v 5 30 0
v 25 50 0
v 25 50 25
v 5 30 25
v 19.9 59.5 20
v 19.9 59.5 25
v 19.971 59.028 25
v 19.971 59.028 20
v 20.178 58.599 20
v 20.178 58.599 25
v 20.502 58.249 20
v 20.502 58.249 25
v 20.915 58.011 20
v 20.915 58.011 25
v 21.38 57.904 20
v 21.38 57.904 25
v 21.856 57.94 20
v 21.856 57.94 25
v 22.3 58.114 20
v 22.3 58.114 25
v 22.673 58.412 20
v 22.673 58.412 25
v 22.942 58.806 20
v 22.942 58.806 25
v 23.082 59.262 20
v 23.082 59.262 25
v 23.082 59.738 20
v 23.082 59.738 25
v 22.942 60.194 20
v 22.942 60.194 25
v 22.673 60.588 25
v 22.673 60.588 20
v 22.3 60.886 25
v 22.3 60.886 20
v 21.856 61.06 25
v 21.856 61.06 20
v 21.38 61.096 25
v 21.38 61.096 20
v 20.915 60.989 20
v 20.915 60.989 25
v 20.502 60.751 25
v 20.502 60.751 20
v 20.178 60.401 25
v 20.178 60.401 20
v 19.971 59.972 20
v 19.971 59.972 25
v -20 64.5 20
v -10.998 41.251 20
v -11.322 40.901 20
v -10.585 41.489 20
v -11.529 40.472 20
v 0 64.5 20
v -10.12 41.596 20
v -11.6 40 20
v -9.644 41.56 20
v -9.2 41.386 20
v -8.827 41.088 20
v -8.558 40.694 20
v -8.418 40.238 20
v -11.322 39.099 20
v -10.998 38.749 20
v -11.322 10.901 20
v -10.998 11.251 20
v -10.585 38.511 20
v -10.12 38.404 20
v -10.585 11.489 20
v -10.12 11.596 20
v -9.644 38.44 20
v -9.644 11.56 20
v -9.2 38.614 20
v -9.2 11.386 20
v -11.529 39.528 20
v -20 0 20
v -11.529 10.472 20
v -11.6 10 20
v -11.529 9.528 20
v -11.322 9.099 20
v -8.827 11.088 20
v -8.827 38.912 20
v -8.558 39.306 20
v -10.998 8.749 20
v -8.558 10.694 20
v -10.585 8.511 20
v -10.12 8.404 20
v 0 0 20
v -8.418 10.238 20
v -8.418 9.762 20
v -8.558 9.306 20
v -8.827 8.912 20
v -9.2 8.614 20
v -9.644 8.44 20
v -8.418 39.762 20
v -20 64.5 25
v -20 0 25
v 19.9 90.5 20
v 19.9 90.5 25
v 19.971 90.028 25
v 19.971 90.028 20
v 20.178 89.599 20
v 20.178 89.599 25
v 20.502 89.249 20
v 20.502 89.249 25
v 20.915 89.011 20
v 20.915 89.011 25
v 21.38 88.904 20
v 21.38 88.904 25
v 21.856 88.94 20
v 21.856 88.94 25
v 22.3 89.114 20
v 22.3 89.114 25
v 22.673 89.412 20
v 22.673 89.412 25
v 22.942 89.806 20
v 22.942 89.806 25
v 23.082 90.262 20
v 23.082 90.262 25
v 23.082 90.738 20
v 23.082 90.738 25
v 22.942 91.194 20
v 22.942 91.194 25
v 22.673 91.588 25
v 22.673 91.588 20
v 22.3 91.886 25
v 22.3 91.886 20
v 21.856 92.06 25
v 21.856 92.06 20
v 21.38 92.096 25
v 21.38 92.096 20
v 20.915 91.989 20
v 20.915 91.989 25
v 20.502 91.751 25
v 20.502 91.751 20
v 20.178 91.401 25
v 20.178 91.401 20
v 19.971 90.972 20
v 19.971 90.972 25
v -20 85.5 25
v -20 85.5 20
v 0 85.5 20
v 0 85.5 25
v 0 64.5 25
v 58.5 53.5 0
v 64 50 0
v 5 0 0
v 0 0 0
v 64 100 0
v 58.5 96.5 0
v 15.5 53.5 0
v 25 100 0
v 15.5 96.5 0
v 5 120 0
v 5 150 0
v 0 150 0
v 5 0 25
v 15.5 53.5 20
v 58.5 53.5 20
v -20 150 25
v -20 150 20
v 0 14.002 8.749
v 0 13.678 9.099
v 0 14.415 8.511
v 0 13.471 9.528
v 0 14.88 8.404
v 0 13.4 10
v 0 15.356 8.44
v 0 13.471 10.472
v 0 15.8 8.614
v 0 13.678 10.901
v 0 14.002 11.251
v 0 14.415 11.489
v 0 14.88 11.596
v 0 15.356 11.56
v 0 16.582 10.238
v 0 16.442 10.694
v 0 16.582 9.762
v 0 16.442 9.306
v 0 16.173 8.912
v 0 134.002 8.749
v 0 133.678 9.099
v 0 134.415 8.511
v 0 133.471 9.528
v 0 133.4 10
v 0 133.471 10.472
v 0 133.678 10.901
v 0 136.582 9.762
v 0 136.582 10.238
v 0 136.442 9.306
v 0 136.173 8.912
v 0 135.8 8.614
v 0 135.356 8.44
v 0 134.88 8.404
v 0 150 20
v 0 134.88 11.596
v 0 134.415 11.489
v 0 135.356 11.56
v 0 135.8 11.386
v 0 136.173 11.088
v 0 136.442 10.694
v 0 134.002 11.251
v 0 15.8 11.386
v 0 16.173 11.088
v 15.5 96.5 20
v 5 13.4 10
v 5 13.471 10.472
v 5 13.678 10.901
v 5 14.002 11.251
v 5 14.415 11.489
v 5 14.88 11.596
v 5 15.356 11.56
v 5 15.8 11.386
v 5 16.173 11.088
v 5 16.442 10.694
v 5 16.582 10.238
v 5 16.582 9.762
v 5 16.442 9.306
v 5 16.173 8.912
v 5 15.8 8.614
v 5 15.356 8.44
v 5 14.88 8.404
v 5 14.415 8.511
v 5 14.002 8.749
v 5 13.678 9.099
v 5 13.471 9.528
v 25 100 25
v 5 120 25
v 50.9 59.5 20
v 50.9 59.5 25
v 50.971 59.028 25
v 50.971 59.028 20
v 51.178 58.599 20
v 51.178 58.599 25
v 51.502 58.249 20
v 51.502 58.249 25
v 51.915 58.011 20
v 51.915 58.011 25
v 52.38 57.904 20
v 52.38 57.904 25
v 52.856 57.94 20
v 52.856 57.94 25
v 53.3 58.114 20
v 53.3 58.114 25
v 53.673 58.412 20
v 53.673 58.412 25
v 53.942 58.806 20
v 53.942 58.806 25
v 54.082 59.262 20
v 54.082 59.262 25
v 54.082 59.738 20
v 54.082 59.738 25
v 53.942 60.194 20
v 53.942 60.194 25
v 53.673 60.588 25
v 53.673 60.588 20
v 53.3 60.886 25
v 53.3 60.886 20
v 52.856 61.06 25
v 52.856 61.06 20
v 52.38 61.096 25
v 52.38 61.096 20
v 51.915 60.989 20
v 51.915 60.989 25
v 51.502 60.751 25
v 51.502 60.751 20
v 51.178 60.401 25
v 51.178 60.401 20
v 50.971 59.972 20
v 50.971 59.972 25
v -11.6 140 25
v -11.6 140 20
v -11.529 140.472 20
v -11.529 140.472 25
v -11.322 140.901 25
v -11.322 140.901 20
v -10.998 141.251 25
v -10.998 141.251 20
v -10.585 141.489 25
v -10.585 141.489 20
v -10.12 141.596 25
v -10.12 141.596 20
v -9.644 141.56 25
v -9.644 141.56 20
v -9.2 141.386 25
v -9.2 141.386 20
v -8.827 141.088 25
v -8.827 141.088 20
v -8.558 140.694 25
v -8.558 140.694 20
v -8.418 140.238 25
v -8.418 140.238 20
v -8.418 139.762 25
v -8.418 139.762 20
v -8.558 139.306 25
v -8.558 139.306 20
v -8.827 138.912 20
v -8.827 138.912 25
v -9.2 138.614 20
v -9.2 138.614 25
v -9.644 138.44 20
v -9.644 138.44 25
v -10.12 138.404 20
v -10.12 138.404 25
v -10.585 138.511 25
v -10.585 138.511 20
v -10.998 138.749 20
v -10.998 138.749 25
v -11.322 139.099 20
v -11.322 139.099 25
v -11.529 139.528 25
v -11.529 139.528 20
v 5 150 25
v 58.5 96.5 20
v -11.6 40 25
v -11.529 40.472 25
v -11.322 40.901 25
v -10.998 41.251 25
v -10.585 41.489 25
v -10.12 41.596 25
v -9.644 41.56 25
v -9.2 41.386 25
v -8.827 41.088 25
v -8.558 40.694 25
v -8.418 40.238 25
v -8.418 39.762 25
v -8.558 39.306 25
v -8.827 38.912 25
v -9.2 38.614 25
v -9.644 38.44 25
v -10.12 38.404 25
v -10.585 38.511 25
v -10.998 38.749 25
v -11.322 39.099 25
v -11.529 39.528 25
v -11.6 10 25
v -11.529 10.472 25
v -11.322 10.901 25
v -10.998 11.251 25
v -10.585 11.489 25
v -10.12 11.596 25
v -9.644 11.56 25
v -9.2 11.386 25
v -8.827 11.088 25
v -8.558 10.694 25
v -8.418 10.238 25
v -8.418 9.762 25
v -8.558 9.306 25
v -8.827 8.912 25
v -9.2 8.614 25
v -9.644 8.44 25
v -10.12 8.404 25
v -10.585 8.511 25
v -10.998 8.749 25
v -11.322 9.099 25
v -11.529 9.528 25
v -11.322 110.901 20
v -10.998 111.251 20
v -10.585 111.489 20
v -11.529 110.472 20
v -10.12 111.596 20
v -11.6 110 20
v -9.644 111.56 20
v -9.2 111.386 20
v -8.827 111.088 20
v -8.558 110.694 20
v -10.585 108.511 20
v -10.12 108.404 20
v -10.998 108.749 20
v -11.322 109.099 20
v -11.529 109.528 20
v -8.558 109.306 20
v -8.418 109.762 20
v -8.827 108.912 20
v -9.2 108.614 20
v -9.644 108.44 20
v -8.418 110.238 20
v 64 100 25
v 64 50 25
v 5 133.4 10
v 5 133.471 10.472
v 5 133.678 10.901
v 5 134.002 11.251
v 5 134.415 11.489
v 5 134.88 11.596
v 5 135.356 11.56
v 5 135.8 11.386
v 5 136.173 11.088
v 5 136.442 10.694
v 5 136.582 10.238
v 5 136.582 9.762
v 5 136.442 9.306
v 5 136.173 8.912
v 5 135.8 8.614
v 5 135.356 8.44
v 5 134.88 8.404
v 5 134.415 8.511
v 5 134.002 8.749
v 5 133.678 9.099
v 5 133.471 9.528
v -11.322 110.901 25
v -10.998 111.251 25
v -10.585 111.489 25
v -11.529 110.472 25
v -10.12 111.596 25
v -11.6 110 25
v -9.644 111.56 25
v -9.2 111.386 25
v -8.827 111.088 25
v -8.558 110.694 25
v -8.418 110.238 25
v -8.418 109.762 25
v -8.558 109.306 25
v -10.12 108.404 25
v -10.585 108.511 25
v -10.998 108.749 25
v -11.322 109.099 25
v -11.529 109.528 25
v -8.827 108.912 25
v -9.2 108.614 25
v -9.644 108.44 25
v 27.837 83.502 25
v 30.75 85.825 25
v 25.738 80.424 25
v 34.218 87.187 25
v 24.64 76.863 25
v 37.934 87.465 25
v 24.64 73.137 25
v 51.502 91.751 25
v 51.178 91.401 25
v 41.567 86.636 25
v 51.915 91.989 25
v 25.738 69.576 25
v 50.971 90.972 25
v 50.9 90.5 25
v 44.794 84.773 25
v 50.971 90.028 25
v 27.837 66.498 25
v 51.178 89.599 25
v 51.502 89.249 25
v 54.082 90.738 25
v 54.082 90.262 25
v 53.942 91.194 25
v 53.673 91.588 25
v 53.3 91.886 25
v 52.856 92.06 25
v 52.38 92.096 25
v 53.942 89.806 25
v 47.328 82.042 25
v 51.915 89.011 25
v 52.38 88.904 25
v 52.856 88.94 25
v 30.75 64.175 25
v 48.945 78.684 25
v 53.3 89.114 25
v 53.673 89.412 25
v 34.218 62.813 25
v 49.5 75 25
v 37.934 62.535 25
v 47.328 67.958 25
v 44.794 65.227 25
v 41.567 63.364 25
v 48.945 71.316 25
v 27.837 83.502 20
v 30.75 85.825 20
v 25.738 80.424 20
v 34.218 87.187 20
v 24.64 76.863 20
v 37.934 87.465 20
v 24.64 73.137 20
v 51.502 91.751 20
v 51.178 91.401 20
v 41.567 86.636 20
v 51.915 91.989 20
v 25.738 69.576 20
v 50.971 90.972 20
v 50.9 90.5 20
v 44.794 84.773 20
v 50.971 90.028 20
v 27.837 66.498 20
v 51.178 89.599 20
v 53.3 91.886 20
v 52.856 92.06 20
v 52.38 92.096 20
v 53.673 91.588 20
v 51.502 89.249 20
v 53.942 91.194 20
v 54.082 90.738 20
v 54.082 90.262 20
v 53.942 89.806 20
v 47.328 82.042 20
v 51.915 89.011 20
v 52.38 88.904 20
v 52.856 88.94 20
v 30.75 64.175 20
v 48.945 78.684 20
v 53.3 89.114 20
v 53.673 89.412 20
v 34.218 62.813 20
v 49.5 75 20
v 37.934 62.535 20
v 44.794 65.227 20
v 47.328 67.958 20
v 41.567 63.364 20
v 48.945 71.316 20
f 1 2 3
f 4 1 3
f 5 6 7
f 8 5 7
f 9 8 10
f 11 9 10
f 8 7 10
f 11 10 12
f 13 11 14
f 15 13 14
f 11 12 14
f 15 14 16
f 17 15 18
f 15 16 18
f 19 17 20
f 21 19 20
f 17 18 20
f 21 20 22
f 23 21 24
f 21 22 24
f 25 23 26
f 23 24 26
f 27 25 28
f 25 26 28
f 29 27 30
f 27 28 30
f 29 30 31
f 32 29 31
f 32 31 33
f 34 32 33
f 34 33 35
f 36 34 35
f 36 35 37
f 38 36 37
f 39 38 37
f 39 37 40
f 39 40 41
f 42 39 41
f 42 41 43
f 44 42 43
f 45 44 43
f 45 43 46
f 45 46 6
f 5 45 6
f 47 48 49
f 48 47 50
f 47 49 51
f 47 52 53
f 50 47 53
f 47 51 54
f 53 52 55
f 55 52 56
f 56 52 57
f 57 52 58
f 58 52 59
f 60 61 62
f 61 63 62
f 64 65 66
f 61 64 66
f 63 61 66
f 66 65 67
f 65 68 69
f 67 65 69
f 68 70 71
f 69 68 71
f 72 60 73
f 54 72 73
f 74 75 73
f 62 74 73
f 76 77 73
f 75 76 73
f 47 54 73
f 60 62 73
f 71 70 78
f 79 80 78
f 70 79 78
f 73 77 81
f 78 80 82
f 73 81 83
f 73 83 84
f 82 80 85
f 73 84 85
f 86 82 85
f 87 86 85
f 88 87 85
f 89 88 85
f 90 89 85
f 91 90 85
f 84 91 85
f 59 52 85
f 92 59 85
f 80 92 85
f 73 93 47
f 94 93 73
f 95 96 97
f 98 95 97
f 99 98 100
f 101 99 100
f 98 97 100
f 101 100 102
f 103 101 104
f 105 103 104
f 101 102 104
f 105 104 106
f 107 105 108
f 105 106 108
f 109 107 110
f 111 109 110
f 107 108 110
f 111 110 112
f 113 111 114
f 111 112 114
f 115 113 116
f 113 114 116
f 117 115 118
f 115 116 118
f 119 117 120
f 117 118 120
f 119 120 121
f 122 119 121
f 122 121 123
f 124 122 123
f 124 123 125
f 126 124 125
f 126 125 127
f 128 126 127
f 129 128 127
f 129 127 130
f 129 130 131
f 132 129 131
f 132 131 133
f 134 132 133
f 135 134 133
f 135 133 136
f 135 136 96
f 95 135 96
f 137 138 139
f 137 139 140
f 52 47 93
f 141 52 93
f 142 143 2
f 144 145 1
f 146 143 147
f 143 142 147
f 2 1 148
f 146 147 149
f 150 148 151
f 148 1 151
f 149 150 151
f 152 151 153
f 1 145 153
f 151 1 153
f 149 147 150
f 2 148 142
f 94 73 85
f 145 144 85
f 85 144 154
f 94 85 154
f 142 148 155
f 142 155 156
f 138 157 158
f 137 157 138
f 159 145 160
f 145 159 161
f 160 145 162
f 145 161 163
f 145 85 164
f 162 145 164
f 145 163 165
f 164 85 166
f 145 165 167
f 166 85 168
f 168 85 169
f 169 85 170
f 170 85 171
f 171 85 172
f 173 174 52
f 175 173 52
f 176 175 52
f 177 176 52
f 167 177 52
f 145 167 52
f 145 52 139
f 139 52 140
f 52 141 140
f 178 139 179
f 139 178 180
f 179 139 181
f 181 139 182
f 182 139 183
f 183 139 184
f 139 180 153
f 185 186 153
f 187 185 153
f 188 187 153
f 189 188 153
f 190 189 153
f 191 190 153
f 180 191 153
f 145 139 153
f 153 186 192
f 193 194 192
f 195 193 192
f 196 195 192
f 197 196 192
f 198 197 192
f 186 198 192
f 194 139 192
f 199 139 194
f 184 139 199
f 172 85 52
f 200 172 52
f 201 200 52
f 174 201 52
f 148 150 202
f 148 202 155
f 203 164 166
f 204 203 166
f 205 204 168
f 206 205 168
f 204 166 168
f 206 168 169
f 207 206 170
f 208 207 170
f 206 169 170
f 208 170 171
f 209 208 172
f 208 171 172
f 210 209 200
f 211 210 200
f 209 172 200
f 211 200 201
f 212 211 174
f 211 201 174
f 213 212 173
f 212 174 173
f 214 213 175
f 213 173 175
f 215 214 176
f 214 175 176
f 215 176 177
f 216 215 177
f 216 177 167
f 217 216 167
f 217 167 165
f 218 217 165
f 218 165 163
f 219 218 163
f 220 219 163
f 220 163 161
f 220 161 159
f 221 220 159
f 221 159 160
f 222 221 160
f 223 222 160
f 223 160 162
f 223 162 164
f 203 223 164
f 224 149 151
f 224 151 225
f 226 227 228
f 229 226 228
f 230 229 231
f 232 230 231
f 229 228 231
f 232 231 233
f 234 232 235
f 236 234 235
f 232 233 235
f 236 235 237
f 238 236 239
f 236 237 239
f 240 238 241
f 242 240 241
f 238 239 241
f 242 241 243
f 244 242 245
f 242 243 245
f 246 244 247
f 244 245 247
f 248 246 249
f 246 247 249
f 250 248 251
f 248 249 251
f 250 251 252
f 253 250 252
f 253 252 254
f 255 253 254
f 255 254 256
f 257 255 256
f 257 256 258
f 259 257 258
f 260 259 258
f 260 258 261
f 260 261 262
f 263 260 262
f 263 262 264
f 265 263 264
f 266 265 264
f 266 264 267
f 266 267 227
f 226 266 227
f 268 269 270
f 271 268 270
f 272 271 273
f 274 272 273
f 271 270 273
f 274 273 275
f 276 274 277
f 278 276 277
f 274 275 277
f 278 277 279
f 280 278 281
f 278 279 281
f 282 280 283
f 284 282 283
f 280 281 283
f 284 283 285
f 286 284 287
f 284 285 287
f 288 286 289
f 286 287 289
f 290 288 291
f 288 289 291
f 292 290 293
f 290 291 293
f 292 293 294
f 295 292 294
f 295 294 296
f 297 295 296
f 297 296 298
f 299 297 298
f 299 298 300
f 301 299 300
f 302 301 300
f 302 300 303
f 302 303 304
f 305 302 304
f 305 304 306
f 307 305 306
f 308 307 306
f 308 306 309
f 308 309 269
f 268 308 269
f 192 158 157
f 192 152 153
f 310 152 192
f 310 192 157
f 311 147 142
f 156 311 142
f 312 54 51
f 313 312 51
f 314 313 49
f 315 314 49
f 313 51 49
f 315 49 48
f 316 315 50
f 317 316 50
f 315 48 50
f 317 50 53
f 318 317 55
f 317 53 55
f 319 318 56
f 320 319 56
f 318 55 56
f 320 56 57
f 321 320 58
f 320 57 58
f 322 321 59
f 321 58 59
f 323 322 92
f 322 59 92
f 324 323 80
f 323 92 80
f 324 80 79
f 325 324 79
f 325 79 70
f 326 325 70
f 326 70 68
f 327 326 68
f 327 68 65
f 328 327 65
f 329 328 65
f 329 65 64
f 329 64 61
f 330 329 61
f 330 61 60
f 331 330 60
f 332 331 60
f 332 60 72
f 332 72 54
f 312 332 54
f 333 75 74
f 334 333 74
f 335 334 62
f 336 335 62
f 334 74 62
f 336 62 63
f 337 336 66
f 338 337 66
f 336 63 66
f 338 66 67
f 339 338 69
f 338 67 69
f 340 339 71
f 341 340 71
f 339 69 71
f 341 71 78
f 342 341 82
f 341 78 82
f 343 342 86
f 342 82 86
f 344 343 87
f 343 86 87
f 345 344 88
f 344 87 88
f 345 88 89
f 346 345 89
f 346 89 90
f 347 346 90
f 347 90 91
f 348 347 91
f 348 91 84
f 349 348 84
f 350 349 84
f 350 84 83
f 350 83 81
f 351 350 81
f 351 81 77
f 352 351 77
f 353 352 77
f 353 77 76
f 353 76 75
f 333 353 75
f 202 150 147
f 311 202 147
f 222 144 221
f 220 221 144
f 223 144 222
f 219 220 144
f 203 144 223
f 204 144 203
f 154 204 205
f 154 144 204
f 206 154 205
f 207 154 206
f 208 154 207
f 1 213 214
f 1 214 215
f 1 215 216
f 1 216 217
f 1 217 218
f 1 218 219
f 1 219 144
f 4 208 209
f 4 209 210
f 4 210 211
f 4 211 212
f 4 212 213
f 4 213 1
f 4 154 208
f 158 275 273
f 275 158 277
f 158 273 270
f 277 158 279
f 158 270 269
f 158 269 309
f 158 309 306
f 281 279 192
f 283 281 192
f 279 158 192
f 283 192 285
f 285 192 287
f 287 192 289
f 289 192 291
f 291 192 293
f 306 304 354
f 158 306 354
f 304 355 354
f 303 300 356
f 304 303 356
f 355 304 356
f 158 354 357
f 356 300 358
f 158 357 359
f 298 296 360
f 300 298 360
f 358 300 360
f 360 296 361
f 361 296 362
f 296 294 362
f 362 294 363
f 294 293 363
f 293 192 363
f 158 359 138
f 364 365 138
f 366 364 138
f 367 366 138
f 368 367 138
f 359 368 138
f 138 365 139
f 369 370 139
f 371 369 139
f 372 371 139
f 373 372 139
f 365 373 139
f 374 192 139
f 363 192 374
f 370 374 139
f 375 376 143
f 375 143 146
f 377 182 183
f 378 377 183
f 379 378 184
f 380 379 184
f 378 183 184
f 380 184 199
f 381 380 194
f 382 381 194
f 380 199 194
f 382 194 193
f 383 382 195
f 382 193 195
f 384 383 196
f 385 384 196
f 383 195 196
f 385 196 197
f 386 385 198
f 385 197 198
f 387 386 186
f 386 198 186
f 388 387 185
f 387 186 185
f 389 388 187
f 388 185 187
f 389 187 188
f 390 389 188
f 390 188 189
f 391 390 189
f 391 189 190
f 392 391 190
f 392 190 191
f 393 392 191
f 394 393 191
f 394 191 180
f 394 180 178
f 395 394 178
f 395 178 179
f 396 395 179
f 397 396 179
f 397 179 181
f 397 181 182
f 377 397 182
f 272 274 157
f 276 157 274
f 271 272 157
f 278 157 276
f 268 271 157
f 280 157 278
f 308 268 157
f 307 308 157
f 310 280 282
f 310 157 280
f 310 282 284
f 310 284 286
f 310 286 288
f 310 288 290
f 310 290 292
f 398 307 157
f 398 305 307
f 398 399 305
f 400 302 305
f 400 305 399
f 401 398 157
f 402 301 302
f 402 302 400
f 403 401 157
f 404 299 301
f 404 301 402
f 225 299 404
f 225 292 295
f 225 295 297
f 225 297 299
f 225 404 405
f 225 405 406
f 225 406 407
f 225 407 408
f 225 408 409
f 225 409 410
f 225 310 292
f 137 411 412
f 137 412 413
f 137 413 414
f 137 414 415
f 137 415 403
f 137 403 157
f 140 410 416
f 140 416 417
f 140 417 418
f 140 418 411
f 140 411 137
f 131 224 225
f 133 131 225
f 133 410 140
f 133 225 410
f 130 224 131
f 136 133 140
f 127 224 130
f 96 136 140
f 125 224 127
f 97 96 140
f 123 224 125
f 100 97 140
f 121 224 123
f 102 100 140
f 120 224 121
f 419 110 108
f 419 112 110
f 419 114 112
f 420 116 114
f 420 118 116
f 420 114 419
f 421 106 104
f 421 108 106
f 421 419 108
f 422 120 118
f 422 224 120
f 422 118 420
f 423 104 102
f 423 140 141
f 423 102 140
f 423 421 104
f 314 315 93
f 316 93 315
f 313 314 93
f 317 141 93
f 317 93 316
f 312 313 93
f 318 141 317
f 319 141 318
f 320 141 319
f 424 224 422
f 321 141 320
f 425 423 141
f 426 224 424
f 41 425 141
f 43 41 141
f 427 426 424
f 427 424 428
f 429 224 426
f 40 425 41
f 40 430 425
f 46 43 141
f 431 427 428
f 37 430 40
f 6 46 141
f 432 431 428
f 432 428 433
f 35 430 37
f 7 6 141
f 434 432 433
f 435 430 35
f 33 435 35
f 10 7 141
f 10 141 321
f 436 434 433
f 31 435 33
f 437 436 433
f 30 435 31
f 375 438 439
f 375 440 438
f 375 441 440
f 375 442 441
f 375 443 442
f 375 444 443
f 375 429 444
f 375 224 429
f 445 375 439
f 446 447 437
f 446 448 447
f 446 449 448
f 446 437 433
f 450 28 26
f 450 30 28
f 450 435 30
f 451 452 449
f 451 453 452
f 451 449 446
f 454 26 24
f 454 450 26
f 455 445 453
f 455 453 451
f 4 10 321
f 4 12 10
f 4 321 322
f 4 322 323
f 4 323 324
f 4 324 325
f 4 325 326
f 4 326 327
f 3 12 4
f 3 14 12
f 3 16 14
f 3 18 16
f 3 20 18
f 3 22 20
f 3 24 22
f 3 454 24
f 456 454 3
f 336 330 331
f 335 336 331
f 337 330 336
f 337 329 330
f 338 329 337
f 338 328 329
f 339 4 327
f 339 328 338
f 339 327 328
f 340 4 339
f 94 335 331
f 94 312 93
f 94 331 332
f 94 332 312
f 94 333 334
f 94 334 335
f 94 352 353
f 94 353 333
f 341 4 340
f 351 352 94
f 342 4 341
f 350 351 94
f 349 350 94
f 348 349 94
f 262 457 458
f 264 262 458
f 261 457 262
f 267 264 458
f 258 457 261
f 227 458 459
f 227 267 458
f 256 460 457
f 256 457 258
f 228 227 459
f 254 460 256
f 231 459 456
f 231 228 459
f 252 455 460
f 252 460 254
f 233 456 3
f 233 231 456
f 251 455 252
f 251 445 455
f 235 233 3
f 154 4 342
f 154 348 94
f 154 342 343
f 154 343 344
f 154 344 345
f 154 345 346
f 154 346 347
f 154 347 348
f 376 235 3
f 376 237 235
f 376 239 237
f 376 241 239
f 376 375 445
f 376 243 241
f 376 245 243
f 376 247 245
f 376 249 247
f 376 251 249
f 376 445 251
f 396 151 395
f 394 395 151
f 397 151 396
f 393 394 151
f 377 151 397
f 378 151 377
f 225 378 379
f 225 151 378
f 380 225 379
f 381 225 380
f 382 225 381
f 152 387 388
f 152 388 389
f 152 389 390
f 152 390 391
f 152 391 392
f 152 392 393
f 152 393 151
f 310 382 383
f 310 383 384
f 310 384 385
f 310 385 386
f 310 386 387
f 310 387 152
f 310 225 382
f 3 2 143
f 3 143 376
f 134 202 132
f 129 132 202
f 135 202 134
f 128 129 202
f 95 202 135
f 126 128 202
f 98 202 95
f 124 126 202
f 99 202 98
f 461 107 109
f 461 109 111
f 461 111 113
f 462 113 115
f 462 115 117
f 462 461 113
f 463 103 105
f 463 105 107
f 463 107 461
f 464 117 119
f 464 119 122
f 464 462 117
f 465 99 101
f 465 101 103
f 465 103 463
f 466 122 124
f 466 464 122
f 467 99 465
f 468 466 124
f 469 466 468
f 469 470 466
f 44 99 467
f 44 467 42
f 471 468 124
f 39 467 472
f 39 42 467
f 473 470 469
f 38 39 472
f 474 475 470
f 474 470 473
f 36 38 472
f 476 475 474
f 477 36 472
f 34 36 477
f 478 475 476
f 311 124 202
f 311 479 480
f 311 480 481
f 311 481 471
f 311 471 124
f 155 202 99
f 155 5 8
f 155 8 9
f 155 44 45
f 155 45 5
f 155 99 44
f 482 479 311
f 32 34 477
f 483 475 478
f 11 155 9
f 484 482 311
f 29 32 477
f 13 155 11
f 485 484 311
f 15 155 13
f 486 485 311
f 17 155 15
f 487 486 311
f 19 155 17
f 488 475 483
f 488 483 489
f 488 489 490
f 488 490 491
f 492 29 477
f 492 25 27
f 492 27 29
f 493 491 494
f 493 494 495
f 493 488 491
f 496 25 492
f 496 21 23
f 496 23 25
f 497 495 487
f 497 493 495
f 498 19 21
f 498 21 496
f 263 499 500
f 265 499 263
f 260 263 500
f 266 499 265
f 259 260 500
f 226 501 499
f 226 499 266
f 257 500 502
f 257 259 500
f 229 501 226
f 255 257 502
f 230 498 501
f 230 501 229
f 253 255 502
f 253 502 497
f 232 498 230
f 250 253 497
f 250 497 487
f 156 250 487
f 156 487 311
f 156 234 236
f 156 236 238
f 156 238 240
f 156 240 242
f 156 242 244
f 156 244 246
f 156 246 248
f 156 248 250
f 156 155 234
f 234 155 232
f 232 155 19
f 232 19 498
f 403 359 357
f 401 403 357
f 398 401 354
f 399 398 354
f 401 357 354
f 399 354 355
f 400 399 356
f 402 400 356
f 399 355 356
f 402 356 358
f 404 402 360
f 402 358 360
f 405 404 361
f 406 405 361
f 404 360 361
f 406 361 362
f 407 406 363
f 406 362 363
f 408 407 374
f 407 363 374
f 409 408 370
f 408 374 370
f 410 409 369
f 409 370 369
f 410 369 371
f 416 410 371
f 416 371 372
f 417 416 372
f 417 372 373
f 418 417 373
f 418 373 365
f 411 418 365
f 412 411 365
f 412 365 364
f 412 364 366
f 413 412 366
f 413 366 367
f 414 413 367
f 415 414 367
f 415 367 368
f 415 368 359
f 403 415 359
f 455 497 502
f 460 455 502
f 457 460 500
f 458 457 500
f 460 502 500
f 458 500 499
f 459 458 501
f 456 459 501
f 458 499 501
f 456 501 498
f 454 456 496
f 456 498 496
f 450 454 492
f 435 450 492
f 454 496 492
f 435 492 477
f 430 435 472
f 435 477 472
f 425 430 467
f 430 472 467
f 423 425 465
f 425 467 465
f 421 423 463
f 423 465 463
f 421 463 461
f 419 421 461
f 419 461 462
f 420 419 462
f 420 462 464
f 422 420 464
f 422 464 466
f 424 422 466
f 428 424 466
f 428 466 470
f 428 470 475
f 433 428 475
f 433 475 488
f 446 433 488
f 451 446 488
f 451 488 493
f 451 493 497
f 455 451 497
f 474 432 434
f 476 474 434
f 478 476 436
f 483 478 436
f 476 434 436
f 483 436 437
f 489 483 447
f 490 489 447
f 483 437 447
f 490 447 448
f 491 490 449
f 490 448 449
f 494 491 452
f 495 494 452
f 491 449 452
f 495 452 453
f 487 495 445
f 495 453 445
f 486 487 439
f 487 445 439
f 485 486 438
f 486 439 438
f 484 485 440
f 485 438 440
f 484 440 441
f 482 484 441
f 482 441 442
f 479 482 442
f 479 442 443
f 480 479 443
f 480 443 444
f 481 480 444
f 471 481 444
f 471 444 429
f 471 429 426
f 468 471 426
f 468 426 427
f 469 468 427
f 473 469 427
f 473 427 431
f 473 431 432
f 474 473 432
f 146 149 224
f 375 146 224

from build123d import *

# Parameters (mm, degrees)
F0_W      = 150
F0_H      = 25
F1_DEPTH  = 5
F2_W      = 50
F2_H      = 25
F3_DEPTH  = 59
F4_W      = 43
F4_H      = 43
F5_DEPTH  = 20
F7_D      = 3.2
F7_DEPTH  = 8
F7_TIP    = 0.9613769904
F6_R      = 12.5
F8_DEPTH  = 5.001
F10_D     = 3.2
F10_DEPTH = 8
F10_TIP   = 0.9613769904
F11_SIZE  = 20
F12_W     = 150
F12_H     = 5
F13_DEPTH = 20
F14_W     = 21
F14_H     = 5
F15_DEPTH = 20
F17_D     = 3.2
F17_DEPTH = 8
F17_TIP   = 0.9613769904


with BuildPart() as f1:
    # F0 (on Right) → F1 (new body)
    with BuildSketch(Plane.YZ):
        with Locations((75, 12.5)):
            Rectangle(F0_W, F0_H)
    extrude(amount=F1_DEPTH)

    # F2 (on face) → F3 (join)
    with BuildSketch(Plane.YZ.offset(5)):
        with Locations((75, 12.5)):
            Rectangle(F2_W, F2_H)
    extrude(amount=F3_DEPTH)

    # F4 (on face) → F5 (cut)
    with BuildSketch(Plane(origin=(0, 0, 0), x_dir=(1, 0, 0), z_dir=(0, 0, -1))):
        with Locations((37, -75)):
            Rectangle(F4_W, F4_H)
    extrude(amount=-F5_DEPTH, mode=Mode.SUBTRACT)

    # F7
    with Locations(Plane(origin=(0, 0, 20), x_dir=(1, 0, 0), z_dir=(0, 0, -1))):
        with Locations((21.5, -59.5), (52.5, -59.5), (52.5, -90.5), (21.5, -90.5)):
            Hole(F7_D / 2, depth=F7_DEPTH)
            with Locations((0, 0, -(F7_DEPTH + F7_TIP / 2))):  # 118° drill point
                Cone(0, F7_D / 2, F7_TIP, mode=Mode.SUBTRACT)

    # F6 (on face) → F8 (cut, through all)
    with BuildSketch(Plane(origin=(0, 0, 20), x_dir=(1, 0, 0), z_dir=(0, 0, -1))):
        with Locations((37, -75)):
            Circle(F6_R)
    extrude(amount=-F8_DEPTH, mode=Mode.SUBTRACT)

    # F10
    with Locations(Plane.YZ.offset(5)):
        with Locations((15, 10), (135, 10)):
            Hole(F10_D / 2, depth=F10_DEPTH)
            with Locations((0, 0, -(F10_DEPTH + F10_TIP / 2))):  # 118° drill point
                Cone(0, F10_D / 2, F10_TIP, mode=Mode.SUBTRACT)

    # F11
    f11_edges = [f1.edges().sort_by_distance(p)[0] for p in [
        (5, 50, 12.5),
        (5, 100, 12.5),
    ]]
    chamfer(f11_edges, length=F11_SIZE)

    # F12 (on face) → F13 (join)
    with BuildSketch(Plane(origin=(0, 0, 0), x_dir=(0, -1, 0), z_dir=(-1, 0, 0))):
        with Locations((-75, 22.5)):
            Rectangle(F12_W, F12_H)
    extrude(amount=F13_DEPTH)

    # F14 (on face) → F15 (cut, through all)
    with BuildSketch(Plane(origin=(-20, 0, 0), x_dir=(0, -1, 0), z_dir=(-1, 0, 0))):
        with Locations((-75, 22.5)):
            Rectangle(F14_W, F14_H)
    extrude(amount=-F15_DEPTH, mode=Mode.SUBTRACT)

    # F17
    with Locations(Plane.XY.offset(25)):
        with Locations((-10, 10), (-10, 40), (-10, 110), (-10, 140)):
            Hole(F17_D / 2, depth=F17_DEPTH)
            with Locations((0, 0, -(F17_DEPTH + F17_TIP / 2))):  # 118° drill point
                Cone(0, F17_D / 2, F17_TIP, mode=Mode.SUBTRACT)


solid = f1.part
